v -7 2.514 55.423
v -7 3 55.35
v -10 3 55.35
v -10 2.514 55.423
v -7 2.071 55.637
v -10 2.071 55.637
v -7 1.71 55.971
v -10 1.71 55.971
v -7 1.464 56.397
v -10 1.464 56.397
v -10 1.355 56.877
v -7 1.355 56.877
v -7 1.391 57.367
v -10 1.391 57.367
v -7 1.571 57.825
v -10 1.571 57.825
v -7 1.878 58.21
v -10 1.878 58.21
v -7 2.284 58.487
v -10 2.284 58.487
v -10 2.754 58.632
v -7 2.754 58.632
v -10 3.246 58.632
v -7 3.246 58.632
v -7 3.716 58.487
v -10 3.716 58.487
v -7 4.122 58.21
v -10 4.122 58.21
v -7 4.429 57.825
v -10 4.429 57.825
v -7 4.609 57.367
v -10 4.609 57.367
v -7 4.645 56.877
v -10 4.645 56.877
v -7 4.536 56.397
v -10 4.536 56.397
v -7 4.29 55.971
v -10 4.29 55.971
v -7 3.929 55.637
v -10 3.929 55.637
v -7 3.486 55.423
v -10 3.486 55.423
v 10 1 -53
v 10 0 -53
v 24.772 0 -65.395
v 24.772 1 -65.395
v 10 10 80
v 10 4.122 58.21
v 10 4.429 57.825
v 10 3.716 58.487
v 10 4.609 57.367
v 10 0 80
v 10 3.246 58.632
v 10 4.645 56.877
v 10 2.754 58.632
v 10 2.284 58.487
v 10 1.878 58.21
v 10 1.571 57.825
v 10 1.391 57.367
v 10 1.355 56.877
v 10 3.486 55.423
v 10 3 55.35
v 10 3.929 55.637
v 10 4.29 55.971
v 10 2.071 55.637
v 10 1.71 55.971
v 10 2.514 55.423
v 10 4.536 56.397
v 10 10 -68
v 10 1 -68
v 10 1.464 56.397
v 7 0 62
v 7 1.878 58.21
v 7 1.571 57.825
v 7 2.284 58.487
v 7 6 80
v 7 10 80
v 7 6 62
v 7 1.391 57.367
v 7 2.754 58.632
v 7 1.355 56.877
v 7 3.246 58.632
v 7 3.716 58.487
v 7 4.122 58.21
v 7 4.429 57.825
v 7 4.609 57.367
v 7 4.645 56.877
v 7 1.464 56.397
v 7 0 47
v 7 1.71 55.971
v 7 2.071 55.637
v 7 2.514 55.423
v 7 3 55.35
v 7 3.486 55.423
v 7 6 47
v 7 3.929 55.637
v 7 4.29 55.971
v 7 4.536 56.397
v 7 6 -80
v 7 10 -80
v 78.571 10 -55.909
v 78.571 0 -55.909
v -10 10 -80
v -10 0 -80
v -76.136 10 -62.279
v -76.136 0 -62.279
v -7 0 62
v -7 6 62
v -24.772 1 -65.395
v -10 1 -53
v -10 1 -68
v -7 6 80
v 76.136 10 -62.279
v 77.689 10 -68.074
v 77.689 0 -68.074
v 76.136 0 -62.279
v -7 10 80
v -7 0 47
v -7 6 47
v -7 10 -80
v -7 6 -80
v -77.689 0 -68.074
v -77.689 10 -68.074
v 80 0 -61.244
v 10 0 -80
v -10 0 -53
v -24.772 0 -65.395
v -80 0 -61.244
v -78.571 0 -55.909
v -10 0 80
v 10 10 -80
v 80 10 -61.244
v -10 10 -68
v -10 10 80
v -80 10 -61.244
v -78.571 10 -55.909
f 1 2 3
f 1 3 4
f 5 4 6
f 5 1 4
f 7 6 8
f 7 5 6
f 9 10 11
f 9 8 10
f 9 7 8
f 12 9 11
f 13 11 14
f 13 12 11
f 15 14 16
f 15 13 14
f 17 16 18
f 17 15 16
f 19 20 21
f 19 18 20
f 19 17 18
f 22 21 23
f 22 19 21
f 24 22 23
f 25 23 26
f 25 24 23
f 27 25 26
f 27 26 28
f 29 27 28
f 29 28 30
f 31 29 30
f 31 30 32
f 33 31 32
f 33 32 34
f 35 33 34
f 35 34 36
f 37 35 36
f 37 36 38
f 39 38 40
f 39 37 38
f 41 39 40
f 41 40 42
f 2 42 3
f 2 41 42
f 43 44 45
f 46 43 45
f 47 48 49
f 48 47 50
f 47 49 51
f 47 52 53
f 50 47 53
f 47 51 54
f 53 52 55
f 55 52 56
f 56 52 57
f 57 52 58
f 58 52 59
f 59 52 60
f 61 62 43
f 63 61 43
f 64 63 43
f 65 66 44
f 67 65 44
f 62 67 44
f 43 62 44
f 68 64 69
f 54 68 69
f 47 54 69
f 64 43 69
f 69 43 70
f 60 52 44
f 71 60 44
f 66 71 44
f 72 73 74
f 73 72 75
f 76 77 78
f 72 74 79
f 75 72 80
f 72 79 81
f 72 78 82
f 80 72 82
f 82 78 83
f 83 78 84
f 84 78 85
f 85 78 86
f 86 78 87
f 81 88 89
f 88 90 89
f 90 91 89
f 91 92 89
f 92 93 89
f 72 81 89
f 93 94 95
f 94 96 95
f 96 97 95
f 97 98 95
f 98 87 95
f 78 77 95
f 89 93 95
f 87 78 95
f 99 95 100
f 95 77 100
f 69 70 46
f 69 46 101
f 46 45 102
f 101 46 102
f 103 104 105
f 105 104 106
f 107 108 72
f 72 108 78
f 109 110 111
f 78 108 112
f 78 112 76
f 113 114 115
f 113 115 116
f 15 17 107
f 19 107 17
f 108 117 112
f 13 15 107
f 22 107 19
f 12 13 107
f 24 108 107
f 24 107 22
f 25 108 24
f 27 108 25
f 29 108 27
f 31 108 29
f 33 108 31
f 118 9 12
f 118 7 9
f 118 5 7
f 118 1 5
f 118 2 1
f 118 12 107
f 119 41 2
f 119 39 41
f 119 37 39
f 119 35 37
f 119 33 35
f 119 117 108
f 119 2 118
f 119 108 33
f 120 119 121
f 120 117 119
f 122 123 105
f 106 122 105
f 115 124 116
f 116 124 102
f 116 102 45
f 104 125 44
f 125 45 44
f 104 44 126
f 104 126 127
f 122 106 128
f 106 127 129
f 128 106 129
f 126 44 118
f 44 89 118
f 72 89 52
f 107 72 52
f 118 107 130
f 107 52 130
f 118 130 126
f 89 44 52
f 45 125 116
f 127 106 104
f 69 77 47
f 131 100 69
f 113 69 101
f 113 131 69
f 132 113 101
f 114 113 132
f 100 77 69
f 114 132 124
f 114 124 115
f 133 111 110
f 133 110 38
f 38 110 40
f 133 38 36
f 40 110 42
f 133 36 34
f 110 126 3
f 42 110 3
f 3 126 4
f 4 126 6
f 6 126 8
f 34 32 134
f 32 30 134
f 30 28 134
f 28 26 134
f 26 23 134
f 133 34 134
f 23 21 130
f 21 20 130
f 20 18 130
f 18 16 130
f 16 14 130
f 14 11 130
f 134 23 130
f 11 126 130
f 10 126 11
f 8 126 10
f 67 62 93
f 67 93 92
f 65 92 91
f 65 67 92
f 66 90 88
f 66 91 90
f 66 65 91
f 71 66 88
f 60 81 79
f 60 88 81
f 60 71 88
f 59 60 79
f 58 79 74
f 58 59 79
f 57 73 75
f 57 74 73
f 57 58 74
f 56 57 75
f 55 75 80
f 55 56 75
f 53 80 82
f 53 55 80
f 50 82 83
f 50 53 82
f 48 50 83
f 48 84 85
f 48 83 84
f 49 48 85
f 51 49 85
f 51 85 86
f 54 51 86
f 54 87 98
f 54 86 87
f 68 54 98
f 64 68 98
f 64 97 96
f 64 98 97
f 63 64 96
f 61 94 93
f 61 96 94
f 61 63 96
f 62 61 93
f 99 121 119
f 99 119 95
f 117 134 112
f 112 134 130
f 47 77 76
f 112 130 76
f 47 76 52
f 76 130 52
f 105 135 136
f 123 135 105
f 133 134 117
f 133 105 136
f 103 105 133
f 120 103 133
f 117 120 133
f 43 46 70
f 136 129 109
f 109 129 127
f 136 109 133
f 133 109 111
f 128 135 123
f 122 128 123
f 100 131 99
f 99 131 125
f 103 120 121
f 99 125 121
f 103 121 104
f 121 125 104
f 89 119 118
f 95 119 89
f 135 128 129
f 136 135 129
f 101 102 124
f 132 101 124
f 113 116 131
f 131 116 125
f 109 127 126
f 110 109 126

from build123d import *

# Parameters (mm, degrees)
BOSS_EXTRUDE1_DEPTH     = 10
SKETCH2_W               = 14
SKETCH2_H               = 160
CUT_EXTRUDE1_DEPTH      = 4
BOSS_EXTRUDE2_DEPTH     = 10
SKETCH4_W               = 14
SKETCH4_H               = 15
CUT_EXTRUDE2_DEPTH      = 10
CUT_EXTRUDE3_DEPTH      = 20
CUT_EXTRUDE3_DEPTH_BACK = 10
SKETCH5_R               = 1.65
BOSS_EXTRUDE3_DEPTH     = 1


with BuildPart() as part:
    # Sketch1 → Boss-Extrude1 (new body)
    with BuildSketch(Plane(origin=(0, 0, 0), x_dir=(1, 0, 0), z_dir=(0, 1, 0))):
        Polygon((-10, 80), (-80, 61.24355653), (-78.570648621, 55.909144563), (-10, 68), (-10, -80), (10, -80), (10, 68), (78.570648621, 55.909144563), (80, 61.24355653), (10, 80), align=None)
    extrude(amount=BOSS_EXTRUDE1_DEPTH)

    # Sketch2 → Cut-Extrude1 (cut)
    with BuildSketch(Plane(origin=(0, 10, 0), x_dir=(1, 0, 0), z_dir=(0, 1, 0))):
        Rectangle(SKETCH2_W, SKETCH2_H)
    extrude(amount=-CUT_EXTRUDE1_DEPTH, mode=Mode.SUBTRACT)

    # Sketch3 → Boss-Extrude2 (add)
    with BuildSketch(Plane(origin=(0, 10, 0), x_dir=(1, 0, 0), z_dir=(0, 1, 0))):
        Polygon((77.689210965, 68.074387668), (76.136296695, 62.27883271), (80, 61.24355653), align=None)
        Polygon((-77.689210965, 68.074387668), (-76.136296695, 62.27883271), (-80, 61.24355653), align=None)
    extrude(amount=-BOSS_EXTRUDE2_DEPTH)

    # Sketch4 → Cut-Extrude2 (cut)
    with BuildSketch(Plane(origin=(0, 6, 0), x_dir=(1, 0, 0), z_dir=(0, 1, 0))):
        with Locations((0, -54.5)):
            Rectangle(SKETCH4_W, SKETCH4_H)
    extrude(amount=-CUT_EXTRUDE2_DEPTH, mode=Mode.SUBTRACT)

    # Sketch5 → Cut-Extrude3 (cut, two sides: drawn at the far end of the back side and taken through both)
    with BuildSketch(Plane.ZY.offset(-7).offset(-CUT_EXTRUDE3_DEPTH_BACK)):
        with Locations(Location((57, 3, 0), (0, 0, 180))):
            Circle(SKETCH5_R)
    extrude(amount=CUT_EXTRUDE3_DEPTH + CUT_EXTRUDE3_DEPTH_BACK, mode=Mode.SUBTRACT)

    # Sketch6 → Boss-Extrude3 (add)
    with BuildSketch(Plane.XZ):
        Polygon((-24.772116295, -65.395277335), (-10, -53), (-10, -68), align=None)
        Polygon((10, -53), (24.772116295, -65.395277335), (10, -68), align=None)
    extrude(amount=-BOSS_EXTRUDE3_DEPTH)


solid = part.part
